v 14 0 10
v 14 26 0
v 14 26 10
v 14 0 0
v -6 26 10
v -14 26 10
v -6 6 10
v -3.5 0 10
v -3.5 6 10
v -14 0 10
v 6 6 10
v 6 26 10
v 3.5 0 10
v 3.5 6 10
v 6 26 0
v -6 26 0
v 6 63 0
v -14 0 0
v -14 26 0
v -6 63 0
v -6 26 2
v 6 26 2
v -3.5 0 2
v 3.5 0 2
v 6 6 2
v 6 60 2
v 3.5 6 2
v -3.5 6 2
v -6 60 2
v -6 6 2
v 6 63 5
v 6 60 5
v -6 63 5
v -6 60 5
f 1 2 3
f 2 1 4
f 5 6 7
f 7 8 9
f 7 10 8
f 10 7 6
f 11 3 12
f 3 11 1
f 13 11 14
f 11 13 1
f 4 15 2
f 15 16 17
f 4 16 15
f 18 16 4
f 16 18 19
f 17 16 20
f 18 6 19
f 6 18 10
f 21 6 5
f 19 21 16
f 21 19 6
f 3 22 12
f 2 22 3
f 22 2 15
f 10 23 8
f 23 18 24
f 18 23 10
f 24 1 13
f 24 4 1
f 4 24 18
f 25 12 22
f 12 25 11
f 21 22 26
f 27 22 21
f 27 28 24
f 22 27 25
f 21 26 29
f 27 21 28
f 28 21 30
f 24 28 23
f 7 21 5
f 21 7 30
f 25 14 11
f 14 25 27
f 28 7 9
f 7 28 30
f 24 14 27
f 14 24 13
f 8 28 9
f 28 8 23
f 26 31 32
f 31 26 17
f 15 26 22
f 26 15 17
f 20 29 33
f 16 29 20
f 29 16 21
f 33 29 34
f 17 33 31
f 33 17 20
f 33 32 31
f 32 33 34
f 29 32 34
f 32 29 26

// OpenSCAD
shell_size_x = 18 + 5 + 5;
shell_size_y = 63;
shell_size_z = 10;

strain_relief_height = 6;
strain_relief_y = shell_size_y - 3 - 34;
strain_relief_x = 12;

module kb2040()
{
    translate([ 0, 0, 1.25 ]) cube(size = [ 33, 18, 2.5 ], center = true);
}

module mcu_base()
{

    mcu_base_x = 12;
    mcu_base_z = (shell_size_z - strain_relief_height) / 2;
    mcu_retainer_y = 3;

    translate([ -mcu_base_x / 2, 0, 0 ]) cube(size = [ mcu_base_x, shell_size_y, mcu_base_z ]);

    translate([ -mcu_base_x / 2, shell_size_y - mcu_retainer_y, mcu_base_z ])
        cube(size = [ mcu_base_x, mcu_retainer_y, shell_size_z / 2 - mcu_base_z ]);
}

module strain_relief()
{
    mcu_base_z = (shell_size_z - strain_relief_height) / 2;
    connector_shell_y = 20;
    cable_strain_relief_y = 7;
    cable_strain_relief_x = 7;
    difference()
    {
        translate([ -shell_size_x / 2, 0, 0 ]) cube(size = [ shell_size_x, strain_relief_y, shell_size_z ]);

        translate([ -strain_relief_x / 2, strain_relief_y - connector_shell_y, mcu_base_z ])
            cube(size = [ strain_relief_x, connector_shell_y, shell_size_z ]);

        translate([ -cable_strain_relief_x / 2, 0, mcu_base_z ])
            cube(size = [ cable_strain_relief_x, cable_strain_relief_y, shell_size_z ]);
    }
}

strain_relief();
mcu_base();
